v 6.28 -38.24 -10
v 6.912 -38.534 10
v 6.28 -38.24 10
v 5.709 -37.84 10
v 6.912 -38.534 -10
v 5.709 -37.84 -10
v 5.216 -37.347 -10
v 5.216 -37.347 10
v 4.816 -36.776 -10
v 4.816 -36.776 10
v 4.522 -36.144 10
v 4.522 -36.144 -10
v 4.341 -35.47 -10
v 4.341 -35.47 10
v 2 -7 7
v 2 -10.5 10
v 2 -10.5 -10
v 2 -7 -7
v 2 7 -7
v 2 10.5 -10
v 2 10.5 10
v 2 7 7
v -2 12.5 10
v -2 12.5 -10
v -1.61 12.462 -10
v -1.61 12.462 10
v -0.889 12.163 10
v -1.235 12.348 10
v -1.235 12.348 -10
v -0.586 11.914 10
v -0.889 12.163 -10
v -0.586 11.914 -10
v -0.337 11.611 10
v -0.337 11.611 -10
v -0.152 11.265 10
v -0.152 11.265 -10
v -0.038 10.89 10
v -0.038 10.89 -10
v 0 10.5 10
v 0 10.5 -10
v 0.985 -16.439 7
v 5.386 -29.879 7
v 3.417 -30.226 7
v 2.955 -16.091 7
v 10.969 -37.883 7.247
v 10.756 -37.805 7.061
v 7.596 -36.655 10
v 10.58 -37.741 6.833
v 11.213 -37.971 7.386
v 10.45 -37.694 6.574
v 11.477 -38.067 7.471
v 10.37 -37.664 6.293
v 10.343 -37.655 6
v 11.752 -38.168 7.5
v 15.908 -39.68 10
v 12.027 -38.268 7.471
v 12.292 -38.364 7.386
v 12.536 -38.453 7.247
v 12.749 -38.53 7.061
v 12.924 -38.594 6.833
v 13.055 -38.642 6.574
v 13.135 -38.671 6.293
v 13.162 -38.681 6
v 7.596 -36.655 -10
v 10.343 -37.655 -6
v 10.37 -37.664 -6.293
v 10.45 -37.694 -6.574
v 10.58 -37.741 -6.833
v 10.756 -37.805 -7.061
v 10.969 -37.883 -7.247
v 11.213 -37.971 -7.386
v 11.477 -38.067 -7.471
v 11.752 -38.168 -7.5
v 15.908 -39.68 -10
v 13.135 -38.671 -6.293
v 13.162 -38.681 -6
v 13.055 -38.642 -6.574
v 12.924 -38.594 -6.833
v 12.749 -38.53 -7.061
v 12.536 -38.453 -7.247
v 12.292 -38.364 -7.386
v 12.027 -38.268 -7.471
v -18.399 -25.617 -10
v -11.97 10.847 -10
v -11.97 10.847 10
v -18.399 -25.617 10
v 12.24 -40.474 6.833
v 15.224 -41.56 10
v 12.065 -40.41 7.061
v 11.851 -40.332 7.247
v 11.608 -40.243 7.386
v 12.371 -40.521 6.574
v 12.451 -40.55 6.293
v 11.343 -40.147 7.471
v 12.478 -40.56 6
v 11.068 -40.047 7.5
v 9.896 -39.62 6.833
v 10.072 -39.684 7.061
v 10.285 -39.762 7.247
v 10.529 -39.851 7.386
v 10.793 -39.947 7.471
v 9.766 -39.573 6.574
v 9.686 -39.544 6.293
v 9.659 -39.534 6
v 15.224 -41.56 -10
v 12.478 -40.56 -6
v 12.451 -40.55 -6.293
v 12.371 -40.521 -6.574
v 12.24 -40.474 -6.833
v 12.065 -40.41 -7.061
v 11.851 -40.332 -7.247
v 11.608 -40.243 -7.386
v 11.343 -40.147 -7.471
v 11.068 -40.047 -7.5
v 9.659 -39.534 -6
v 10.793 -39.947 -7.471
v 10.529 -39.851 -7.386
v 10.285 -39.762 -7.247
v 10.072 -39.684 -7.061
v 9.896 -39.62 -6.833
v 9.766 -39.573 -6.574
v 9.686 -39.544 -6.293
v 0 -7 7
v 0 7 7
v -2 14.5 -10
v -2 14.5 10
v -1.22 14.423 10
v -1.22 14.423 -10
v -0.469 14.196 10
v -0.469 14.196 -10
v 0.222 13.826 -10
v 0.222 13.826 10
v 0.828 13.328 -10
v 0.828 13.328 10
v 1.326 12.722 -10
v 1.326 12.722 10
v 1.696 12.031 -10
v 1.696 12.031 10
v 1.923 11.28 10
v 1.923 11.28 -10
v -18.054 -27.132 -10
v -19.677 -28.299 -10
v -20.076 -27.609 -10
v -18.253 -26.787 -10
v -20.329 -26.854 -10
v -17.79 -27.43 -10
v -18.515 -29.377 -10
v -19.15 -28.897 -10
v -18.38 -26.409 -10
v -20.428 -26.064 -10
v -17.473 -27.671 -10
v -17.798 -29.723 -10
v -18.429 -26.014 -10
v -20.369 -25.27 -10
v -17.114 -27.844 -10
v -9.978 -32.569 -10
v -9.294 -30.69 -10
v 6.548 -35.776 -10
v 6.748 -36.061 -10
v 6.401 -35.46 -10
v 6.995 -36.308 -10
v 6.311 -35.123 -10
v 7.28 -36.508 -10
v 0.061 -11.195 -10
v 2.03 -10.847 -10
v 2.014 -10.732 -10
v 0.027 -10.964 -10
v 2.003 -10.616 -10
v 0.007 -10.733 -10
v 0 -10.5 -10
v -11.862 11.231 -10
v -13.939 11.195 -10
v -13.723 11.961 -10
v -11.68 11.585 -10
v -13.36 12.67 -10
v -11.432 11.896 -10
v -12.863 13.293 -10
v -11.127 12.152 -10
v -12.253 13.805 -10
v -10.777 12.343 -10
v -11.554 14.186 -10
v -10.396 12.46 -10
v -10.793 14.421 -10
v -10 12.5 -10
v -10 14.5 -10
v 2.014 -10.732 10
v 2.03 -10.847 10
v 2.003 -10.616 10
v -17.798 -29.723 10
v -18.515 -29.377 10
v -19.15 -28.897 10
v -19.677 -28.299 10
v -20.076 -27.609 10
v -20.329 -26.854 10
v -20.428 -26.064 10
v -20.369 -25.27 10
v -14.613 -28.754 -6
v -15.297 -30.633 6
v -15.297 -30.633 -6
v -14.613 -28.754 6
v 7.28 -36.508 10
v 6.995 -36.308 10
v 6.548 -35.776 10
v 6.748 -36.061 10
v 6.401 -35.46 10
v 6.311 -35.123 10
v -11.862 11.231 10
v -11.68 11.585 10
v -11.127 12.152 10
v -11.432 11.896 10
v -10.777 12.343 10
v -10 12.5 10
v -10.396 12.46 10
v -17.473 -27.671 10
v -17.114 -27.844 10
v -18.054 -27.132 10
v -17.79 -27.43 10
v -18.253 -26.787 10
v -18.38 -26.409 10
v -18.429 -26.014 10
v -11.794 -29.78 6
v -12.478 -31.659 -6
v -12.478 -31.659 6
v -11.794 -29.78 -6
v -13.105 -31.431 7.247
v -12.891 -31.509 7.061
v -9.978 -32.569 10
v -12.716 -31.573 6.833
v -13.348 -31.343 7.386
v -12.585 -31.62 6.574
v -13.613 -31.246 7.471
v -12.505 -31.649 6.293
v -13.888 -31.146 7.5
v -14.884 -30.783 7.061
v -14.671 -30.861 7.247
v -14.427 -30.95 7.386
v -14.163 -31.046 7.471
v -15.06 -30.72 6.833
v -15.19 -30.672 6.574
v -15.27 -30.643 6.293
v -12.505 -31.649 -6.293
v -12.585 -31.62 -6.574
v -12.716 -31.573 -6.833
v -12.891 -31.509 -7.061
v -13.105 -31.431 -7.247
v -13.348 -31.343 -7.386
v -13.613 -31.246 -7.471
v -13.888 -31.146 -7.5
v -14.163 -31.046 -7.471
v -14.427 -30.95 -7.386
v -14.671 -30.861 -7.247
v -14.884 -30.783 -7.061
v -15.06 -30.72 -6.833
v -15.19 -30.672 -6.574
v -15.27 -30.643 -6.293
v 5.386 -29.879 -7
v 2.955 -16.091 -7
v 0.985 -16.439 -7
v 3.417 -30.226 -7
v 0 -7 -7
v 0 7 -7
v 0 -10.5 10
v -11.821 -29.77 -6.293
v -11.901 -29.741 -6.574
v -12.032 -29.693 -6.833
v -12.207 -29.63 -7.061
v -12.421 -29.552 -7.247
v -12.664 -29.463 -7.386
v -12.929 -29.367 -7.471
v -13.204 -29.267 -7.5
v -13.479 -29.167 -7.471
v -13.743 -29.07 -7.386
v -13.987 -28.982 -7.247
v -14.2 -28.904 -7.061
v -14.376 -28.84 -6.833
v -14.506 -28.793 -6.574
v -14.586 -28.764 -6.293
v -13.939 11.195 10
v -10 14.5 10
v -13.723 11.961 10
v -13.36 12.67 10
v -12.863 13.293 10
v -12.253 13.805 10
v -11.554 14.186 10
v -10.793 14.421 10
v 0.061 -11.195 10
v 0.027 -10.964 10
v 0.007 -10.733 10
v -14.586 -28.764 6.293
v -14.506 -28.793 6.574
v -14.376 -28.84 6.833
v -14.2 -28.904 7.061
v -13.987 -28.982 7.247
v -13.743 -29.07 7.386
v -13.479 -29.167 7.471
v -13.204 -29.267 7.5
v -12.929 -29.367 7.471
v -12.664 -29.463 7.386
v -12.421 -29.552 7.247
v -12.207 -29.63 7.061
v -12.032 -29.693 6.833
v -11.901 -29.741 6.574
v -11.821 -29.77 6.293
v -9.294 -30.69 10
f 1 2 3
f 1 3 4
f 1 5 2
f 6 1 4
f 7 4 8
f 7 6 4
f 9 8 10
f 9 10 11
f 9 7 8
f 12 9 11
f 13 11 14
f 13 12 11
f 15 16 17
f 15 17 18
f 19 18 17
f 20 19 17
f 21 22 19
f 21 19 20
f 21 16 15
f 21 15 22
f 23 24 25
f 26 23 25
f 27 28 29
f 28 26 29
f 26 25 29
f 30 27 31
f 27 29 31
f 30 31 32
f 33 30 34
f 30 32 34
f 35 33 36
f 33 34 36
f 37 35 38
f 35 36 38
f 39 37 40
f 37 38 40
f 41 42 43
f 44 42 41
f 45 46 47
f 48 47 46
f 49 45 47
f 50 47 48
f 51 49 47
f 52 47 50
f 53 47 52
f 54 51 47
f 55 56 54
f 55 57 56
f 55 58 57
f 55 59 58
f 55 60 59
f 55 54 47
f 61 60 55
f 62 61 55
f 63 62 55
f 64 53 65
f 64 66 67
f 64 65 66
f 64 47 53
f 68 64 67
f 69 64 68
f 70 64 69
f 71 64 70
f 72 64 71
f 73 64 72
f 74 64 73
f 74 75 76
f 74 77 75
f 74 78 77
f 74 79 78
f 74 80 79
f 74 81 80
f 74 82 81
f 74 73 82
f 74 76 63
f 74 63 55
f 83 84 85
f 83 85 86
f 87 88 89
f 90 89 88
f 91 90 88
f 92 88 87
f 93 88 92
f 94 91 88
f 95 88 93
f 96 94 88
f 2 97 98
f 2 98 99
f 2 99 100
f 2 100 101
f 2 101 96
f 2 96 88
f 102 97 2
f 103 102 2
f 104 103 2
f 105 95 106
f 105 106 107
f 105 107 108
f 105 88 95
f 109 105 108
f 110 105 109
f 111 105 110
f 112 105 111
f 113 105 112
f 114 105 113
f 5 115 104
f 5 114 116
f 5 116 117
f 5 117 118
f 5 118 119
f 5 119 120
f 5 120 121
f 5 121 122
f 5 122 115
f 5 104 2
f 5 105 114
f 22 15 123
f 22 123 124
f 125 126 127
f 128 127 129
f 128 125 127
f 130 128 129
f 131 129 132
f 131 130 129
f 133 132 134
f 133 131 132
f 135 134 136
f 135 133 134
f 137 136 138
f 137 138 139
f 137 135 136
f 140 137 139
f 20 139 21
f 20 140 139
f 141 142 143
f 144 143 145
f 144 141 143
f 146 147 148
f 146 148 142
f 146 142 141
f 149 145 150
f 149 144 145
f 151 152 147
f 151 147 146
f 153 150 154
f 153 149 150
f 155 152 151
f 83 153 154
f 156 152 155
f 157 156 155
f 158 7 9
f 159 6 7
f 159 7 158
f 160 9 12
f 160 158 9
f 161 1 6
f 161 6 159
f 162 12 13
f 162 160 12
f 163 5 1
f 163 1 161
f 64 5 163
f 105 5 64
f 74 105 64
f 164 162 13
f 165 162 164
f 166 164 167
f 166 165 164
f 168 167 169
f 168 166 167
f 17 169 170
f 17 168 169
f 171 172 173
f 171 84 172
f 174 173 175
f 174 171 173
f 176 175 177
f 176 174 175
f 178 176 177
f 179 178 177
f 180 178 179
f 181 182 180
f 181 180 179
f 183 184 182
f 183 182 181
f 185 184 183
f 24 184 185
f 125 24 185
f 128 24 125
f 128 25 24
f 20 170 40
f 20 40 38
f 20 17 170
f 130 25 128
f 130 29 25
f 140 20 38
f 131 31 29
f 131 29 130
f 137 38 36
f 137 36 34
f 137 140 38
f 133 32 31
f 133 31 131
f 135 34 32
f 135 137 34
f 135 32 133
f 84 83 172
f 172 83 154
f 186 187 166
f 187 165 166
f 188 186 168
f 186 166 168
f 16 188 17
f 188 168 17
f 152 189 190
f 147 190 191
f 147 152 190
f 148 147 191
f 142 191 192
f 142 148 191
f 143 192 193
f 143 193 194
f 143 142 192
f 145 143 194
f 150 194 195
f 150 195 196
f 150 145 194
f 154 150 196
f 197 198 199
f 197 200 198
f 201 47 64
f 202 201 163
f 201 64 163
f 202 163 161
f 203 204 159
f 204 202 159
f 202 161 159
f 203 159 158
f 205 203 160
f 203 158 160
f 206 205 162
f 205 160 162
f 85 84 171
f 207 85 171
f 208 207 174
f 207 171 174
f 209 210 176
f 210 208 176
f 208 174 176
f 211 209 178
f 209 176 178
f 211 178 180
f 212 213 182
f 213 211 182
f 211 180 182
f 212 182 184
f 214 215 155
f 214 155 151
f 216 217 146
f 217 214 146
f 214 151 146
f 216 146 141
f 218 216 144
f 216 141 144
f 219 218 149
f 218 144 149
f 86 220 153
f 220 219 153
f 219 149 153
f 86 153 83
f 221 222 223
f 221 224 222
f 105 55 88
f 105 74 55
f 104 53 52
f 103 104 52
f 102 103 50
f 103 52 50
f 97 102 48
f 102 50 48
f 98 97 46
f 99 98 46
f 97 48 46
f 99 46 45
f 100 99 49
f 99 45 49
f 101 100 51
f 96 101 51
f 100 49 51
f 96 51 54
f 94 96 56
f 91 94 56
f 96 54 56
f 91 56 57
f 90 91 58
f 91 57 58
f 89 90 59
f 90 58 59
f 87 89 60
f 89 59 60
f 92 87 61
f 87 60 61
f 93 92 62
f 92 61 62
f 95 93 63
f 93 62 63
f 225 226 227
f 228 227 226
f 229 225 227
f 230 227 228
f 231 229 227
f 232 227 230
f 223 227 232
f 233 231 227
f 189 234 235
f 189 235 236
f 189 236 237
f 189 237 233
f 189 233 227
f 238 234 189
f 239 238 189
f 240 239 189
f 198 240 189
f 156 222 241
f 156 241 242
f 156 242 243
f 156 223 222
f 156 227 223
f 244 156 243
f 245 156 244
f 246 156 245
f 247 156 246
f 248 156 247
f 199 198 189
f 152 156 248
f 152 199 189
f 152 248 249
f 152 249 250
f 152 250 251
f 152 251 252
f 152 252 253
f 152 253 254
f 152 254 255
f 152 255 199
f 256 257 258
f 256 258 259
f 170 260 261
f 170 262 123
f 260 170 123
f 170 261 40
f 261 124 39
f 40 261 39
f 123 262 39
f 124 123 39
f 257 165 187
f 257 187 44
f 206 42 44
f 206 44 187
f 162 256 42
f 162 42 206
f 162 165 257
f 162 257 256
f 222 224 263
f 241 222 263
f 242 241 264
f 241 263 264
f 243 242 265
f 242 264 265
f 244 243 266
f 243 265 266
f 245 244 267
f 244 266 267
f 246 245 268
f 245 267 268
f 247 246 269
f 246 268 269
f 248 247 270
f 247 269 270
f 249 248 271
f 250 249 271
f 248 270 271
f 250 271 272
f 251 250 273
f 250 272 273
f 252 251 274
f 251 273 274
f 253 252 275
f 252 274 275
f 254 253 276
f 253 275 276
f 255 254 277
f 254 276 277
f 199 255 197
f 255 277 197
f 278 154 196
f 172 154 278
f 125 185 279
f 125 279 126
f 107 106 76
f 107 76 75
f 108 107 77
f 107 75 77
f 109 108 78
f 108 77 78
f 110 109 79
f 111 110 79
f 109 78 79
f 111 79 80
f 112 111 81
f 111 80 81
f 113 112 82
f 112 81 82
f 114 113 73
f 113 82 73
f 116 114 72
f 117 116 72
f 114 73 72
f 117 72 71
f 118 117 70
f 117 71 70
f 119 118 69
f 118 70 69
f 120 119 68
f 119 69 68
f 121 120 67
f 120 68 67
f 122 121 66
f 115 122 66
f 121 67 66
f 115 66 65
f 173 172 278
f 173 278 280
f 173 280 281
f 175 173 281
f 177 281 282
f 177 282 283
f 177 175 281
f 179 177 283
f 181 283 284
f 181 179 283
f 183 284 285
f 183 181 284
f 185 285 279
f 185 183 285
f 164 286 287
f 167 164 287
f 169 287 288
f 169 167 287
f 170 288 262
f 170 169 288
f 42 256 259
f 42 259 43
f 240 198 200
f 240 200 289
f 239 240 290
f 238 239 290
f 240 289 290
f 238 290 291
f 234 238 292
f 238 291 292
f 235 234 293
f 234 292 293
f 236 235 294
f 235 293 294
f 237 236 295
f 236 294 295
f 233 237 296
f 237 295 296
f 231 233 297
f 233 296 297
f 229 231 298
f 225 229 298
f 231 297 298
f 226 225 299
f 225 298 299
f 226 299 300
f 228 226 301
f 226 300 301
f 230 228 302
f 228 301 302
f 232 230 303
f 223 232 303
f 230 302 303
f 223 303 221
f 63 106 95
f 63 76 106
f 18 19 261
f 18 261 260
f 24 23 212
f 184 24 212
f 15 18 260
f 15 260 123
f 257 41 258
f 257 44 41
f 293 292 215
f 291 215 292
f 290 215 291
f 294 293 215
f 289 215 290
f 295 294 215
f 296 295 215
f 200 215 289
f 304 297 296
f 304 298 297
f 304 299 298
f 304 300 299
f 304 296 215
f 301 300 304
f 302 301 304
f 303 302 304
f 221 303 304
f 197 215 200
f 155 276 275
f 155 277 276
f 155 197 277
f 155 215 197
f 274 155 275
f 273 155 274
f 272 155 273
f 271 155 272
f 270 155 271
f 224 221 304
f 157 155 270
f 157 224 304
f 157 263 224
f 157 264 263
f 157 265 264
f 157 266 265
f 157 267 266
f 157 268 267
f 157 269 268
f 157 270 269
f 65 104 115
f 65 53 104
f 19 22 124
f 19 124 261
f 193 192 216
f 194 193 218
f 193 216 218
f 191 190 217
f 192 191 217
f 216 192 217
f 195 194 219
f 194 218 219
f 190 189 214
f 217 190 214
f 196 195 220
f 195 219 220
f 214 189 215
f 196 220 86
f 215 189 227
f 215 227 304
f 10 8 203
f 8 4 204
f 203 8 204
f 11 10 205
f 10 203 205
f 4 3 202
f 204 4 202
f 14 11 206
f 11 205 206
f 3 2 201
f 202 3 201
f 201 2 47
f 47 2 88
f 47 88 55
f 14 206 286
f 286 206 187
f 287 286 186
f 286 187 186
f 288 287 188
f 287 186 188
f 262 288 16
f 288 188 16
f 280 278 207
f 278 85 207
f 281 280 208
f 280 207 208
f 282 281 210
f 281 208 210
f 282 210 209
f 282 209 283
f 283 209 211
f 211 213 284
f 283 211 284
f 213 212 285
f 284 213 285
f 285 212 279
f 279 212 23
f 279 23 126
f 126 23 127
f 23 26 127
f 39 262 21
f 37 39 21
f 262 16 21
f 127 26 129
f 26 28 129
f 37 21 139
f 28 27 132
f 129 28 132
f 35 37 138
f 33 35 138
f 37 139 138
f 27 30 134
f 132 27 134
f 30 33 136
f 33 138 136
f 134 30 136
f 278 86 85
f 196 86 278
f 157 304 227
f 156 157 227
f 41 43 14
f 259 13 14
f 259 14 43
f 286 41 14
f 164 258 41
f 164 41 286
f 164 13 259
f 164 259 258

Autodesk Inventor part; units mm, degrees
ref_plane "YZ Plane" through (0, 0, 0) normal (1, 0, 0) x (0, 1, 0)
ref_plane "XZ Plane" through (0, 0, 0) normal (0, 1, 0) x (-1, 0, 0)
ref_plane "XY Plane" through (0, 0, 0) normal (0, 0, 1) x (1, 0, 0)
sketch "スケッチ1" plane through (0, 0, 0) normal (1, 0, 0) x (0, 1, 0)
  line L0 (-10.5, -10) -> (10.5, -10)
  line L1 (10.5, -10) -> (10.5, 10)
  line L2 (10.5, 10) -> (-10.5, 10)
  line L3 (-10.5, 10) -> (-10.5, -10)
  line L4 (-10.5, -10) -> (10.5, 10) construction
  line L5 (10.5, -10) -> (-10.5, 10) construction
  point P0 (0, 0)
  dimension "d0" = 21
  dimension "d1" = 20
extrude "プレート1" add sketch "スケッチ1" along normal blind 2
sketch "スケッチ3" plane through (2.0304, -10.8473, -10) normal (-0.9848078, -0.1736482, 0) x (0.1736482, -0.9848078, 0)
  line L0 (0, 20) -> (0, 0)
  line L1 (0, 0) -> (24.65, 0)
  line L2 (24.65, 0) -> (24.65, 20)
  line L3 (24.65, 20) -> (0, 20)
edge flange "フランジ2" height 25 angle 10 thickness 2 bend radius 2 thickness toward (-0.9848078, -0.1736482, 0) relief tear relief width 2 relief depth 1 edges at (2, -10.5, 0) wall of the first edge with corners at (2.0304, -10.8473, 10) (2.0304, -10.8473, -10) (6.3108, -35.1229, -10) (6.3108, -35.1229, 10)
bend "曲げ2"
corner "コーナー2"
sketch "スケッチ5" plane through (2, 0, 0) normal (1, 0, 0) x (0, 0, -1)
  line L0 (7, -7) -> (-7, -7)
  line L1 (-7, -7) -> (-7, 7)
  line L2 (-7, 7) -> (7, 7)
  line L3 (7, 7) -> (7, -7)
  line L4 (7, -7) -> (-7, 7) construction
  line L5 (-7, -7) -> (7, 7) construction
  point P0 (0, 0)
  dimension "d27" = 14
  dimension "d28" = 14
extrude "押し出し2" cut sketch "スケッチ5" against normal blind 10
sketch "スケッチ6" plane through (6.3108, -35.1229, 10) normal (0.9848078, 0.1736482, 0) x (0, 0, -1)
  line L0 (17, 5.325) -> (3, 5.325)
  line L1 (3, 5.325) -> (3, 19.325)
  line L2 (3, 19.325) -> (17, 19.325)
  line L3 (17, 19.325) -> (17, 5.325)
  line L4 (17, 5.325) -> (3, 19.325) construction
  line L5 (3, 5.325) -> (17, 19.325) construction
  line L6 (20, 0) -> (20, 24.65) projected
  line L7 (17, 28.4442) -> (3, 28.4442) projected
  point P0 (10, 35.6851)
  point P1 (10, 12.325)
  point P2 (10, 12.325)
  point P3 (20, 12.325)
  point P4 (10, 12.325)
  point P5 (10, 28.4442)
  dimension "d31" = 14
  dimension "d32" = 14
extrude "押し出し3" cut sketch "スケッチ6" against normal blind 10
sketch "スケッチ7" plane through (7.5964, -36.6549, 10) normal (-0.3420201, -0.9396926, 0) x (-0.9396926, 0.3420201, 0)
  line L0 (0, -20) -> (0, 0)
  line L1 (0, 0) -> (-8.8453, 0)
  line L2 (-8.8453, 0) -> (-8.8453, -20)
  line L3 (-8.8453, -20) -> (0, -20)
edge flange "フランジ3" height 10 angle -60 thickness 2 bend radius 2 thickness toward (-0.3420201, -0.9396926, 0) relief tear relief width 2 relief depth 1 edges at (4.3412, -35.4701, 0) wall of the first edge with corners at (7.5964, -36.6549, -10) (7.5964, -36.6549, 10) (15.9083, -39.6802, 10) (15.9083, -39.6802, -10)
bend "曲げ3"
corner "コーナー3"
sketch "スケッチ8" plane through (15.9083, -39.6802, 10) normal (0.3420201, 0.9396926, 0) x (0.9396926, -0.3420201, 0)
  line L0 (-5.9226, 4) -> (-5.9226, 16)
  arc A0 (-2.9226, 16) -> (-5.9226, 16) centre (-4.4226, 16) ccw
  line L1 (-2.9226, 16) -> (-2.9226, 4)
  arc A1 (-5.9226, 4) -> (-2.9226, 4) centre (-4.4226, 4) ccw
  line L2 (-8.8453, 20) -> (0, 20) projected
  line L3 (0, 0) -> (-8.8453, 0) projected
  point P0 (-28.5203, 10)
  point P1 (-4.4226, 20)
  dimension "d45" = 4
  dimension "d46" = 4
  dimension "d47" = 1.5
extrude "押し出し4" cut sketch "スケッチ8" against normal blind 10
sketch "スケッチ25" plane through (-2, 12.5, -10) normal (0, 1, 0) x (-1, 0, 0)
  line L0 (0, 20) -> (0, 0)
  line L1 (0, 0) -> (8, 0)
  line L2 (8, 0) -> (8, 20)
  line L3 (8, 20) -> (0, 20)
edge flange "フランジ12" height 10 angle 90 thickness 2 bend radius 2 thickness toward (0, 1, 0) relief tear relief width 2 relief depth 1 edges at (0, 10.5, 0) wall of the first edge with corners at (-2, 12.5, 10) (-2, 12.5, -10) (-10, 12.5, -10) (-10, 12.5, 10)
bend "曲げ21"
corner "コーナー12"
sketch "スケッチ26" plane through (-11.9696, 10.8473, -10) normal (-0.9848078, 0.1736482, 0) x (-0.1736482, -0.9848078, 0)
  line L0 (0, 20) -> (0, 0)
  line L1 (0, 0) -> (37.0268, 0)
  line L2 (37.0268, 0) -> (37.0268, 20)
  line L3 (37.0268, 20) -> (0, 20)
edge flange "フランジ13" height 38.705 angle 80 thickness 2 bend radius 2 thickness toward (-0.9848078, 0.1736482, 0) relief tear relief width 2 relief depth 1 edges at (-10, 12.5, 0) wall of the first edge with corners at (-11.9696, 10.8473, 10) (-11.9696, 10.8473, -10) (-18.3993, -25.617, -10) (-18.3993, -25.617, 10)
bend "曲げ22"
corner "コーナー13"
sketch "スケッチ27" plane through (-17.1137, -27.8437, -10) normal (-0.3420201, -0.9396926, 0) x (0.9396926, -0.3420201, 0)
  line L0 (0, 20) -> (0, 0)
  line L1 (0, 0) -> (8.3218, 0)
  line L2 (8.3218, 0) -> (8.3218, 20)
  line L3 (8.3218, 20) -> (0, 20)
edge flange "フランジ14" height 10 angle 80 thickness 2 bend radius 2 thickness toward (-0.3420201, -0.9396926, 0) relief tear relief width 2 relief depth 1 edges at (-18.3993, -25.617, 0) wall of the first edge with corners at (-17.1137, -27.8437, 10) (-17.1137, -27.8437, -10) (-9.2937, -30.6899, -10) (-9.2937, -30.6899, 10)
bend "曲げ23"
corner "コーナー14"
sketch "スケッチ28" plane through (-9.2937, -30.6899, 10) normal (0.3420201, 0.9396926, 0) x (0.9396926, -0.3420201, 0)
  line L0 (-5.6609, 4) -> (-5.6609, 16)
  arc A0 (-2.6609, 16) -> (-5.6609, 16) centre (-4.1609, 16) ccw
  line L1 (-2.6609, 16) -> (-2.6609, 4)
  line L2 (-2.2781, 3) -> (-2.2781, 17) projected
  arc A1 (-5.6609, 4) -> (-2.6609, 4) centre (-4.1609, 4) ccw
  line L3 (0, 0) -> (-8.3218, 0) projected
  line L4 (0, 20) -> (-8.3218, 20) projected
  point P0 (-1.7633, 10)
  point P1 (-4.1609, 20)
  dimension "d224" = 4
  dimension "d225" = 4
  dimension "d226" = 1.5
extrude "押し出し6" cut sketch "スケッチ28" against normal blind 10
equation "\"d2\" = Thickness"
equation "\"d13\" = BendReliefWidth"
equation "\"d14\" = BendReliefDepth"
equation "\"d15\" = MinimumRemnant"
equation "\"d16\" = TransitionRadius"
equation "\"d19\" = BendRadius"
equation "\"d20\" = CornerReliefSize"
equation "\"d21\" = GapSize"
equation "\"d22\" = JacobiRadiusSize"
equation "\"d35\" = BendReliefWidth"
equation "\"d36\" = BendReliefDepth"
equation "\"d37\" = MinimumRemnant"
equation "\"d38\" = TransitionRadius"
equation "\"d41\" = BendRadius"
equation "\"d42\" = CornerReliefSize"
equation "\"d43\" = GapSize"
equation "\"d44\" = JacobiRadiusSize"
equation "\"d194\" = BendReliefWidth"
equation "\"d195\" = BendReliefDepth"
equation "\"d196\" = MinimumRemnant"
equation "\"d197\" = TransitionRadius"
equation "\"d200\" = BendRadius"
equation "\"d201\" = CornerReliefSize"
equation "\"d202\" = GapSize"
equation "\"d203\" = JacobiRadiusSize"
equation "\"d204\" = BendReliefWidth"
equation "\"d205\" = BendReliefDepth"
equation "\"d206\" = MinimumRemnant"
equation "\"d207\" = TransitionRadius"
equation "\"d210\" = BendRadius"
equation "\"d211\" = CornerReliefSize"
equation "\"d212\" = GapSize"
equation "\"d213\" = JacobiRadiusSize"
equation "\"d214\" = BendReliefWidth"
equation "\"d215\" = BendReliefDepth"
equation "\"d216\" = MinimumRemnant"
equation "\"d217\" = TransitionRadius"
equation "\"d220\" = BendRadius"
equation "\"d221\" = CornerReliefSize"
equation "\"d222\" = GapSize"
equation "\"d223\" = JacobiRadiusSize"
equation "\"BendRadius\" = Thickness"
equation "\"BendReliefWidth\" = Thickness"
equation "\"BendReliefDepth\" = 0.5 * Thickness"
equation "\"CornerReliefSize\" = 4 * Thickness"
equation "\"MinimumRemnant\" = 2 * Thickness"
equation "\"TransitionRadius\" = BendRadius"
equation "\"JacobiRadiusSize\" = BendRadius"
equation "\"GapSize\" = Thickness"
equation "\"Thickness\" = 2"
properties part number "ThumbPlate" material "アルミニウム 6061"
